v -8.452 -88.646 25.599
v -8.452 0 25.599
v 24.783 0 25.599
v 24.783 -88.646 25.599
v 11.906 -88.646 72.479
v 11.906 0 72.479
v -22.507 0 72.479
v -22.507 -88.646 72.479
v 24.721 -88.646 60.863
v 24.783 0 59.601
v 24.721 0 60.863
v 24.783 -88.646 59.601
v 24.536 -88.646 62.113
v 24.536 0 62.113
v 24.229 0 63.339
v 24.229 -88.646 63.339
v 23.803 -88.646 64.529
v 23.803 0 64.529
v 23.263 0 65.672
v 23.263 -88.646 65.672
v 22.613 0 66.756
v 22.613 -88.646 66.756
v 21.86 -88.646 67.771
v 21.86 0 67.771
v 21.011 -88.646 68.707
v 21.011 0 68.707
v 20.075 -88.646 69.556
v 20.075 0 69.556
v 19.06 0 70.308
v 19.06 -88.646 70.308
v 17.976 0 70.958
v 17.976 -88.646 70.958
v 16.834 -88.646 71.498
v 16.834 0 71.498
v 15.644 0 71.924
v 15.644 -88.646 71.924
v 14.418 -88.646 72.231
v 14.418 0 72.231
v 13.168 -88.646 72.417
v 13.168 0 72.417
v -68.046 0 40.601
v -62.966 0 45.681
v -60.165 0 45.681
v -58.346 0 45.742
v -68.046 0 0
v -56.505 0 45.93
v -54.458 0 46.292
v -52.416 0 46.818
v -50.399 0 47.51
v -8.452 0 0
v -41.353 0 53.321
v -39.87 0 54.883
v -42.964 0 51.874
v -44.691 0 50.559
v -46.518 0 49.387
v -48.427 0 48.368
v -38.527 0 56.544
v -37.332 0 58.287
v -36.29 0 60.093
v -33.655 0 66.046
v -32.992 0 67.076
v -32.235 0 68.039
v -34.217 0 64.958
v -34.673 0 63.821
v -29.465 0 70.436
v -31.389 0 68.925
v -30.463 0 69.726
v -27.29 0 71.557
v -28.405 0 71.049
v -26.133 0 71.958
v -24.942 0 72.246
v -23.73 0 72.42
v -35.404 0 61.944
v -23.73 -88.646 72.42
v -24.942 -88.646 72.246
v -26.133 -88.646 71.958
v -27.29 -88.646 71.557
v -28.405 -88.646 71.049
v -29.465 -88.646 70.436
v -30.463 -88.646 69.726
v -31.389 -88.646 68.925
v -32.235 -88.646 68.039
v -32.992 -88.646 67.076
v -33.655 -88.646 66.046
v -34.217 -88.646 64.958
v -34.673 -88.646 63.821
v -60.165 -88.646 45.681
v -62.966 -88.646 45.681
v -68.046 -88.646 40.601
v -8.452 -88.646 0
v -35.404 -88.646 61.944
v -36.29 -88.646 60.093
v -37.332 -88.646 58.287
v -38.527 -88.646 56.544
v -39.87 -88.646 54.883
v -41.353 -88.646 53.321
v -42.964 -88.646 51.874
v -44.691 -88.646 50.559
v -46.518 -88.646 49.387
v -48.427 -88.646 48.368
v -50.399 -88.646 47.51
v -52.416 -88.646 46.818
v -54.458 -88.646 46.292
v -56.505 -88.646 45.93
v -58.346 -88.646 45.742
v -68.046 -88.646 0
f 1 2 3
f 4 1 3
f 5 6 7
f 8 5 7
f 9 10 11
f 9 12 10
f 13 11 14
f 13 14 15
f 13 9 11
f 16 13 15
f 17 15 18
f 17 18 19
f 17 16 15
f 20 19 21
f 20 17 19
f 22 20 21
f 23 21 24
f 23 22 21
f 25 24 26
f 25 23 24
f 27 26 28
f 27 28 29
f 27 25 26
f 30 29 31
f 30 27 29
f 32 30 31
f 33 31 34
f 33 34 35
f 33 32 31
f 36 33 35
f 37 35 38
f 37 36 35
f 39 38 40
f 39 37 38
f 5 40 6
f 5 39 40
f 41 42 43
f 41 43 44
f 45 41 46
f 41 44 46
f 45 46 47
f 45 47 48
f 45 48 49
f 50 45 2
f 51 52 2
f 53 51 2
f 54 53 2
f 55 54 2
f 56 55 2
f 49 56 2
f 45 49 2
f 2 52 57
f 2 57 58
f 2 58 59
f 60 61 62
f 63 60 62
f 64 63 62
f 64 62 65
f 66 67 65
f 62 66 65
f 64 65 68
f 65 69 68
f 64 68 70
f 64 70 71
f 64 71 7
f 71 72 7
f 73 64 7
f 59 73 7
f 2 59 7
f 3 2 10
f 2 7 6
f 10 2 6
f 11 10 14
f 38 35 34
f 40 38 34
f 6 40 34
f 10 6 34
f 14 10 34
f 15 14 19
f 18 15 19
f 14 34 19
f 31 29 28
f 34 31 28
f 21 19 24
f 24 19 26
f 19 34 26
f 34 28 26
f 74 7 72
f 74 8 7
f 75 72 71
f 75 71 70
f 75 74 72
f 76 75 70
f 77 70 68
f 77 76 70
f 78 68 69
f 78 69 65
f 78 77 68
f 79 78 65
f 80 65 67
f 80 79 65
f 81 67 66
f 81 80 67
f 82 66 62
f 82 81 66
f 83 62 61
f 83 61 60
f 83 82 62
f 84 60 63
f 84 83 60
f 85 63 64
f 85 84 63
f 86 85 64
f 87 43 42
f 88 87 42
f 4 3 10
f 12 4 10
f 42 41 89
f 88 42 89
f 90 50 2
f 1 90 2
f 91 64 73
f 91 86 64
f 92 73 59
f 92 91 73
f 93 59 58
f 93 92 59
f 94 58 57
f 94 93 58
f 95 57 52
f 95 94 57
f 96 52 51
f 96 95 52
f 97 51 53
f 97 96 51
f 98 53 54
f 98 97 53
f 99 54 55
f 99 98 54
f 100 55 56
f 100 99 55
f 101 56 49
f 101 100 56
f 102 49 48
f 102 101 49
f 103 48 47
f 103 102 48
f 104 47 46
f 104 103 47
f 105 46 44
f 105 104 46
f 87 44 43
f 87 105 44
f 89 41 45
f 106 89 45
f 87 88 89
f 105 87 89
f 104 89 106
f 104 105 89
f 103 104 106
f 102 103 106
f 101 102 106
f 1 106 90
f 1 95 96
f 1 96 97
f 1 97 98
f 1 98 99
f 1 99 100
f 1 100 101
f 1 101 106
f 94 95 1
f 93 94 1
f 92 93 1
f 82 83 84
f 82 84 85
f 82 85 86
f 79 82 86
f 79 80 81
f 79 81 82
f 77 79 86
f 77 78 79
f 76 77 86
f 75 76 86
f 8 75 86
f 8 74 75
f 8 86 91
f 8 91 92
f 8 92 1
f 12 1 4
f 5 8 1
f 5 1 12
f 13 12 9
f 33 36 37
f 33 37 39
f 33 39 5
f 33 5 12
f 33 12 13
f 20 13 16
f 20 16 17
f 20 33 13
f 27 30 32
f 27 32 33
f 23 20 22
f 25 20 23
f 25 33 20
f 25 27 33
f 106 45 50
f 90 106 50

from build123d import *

# Parameters (mm, degrees)
F1_DEPTH = 88.646
F2_R     = 12.877415
F3_R     = 26.981251
F4_SIZE  = 5.08


with BuildPart() as f1:
    # F0 (on Front) → F1 (new body)
    with BuildSketch(Plane.XZ):
        Polygon((-35.384025, 45.681097), (-68.046205, 45.681097), (-68.046205, 0), (-8.452052, 0), (-8.452052, 25.599297), (24.783138, 25.599297), (24.783138, 72.478622), (-35.384025, 72.478622), align=None)
    extrude(amount=F1_DEPTH)

    # F2
    f2_edges = [f1.edges().sort_by_distance(p)[0] for p in [
        (24.783138, -44.323, 72.478622),
        (-35.384025, -44.323, 72.478622),
    ]]
    fillet(f2_edges, radius=F2_R)

    # F3
    f3_edges = [f1.edges().sort_by_distance(p)[0] for p in [
        (-35.384025, -44.323, 45.681097),
    ]]
    fillet(f3_edges, radius=F3_R)

    # F4
    f4_edges = [f1.edges().sort_by_distance(p)[0] for p in [
        (-68.046205, -44.323, 45.681097),
    ]]
    chamfer(f4_edges, length=F4_SIZE)


solid = f1.part
